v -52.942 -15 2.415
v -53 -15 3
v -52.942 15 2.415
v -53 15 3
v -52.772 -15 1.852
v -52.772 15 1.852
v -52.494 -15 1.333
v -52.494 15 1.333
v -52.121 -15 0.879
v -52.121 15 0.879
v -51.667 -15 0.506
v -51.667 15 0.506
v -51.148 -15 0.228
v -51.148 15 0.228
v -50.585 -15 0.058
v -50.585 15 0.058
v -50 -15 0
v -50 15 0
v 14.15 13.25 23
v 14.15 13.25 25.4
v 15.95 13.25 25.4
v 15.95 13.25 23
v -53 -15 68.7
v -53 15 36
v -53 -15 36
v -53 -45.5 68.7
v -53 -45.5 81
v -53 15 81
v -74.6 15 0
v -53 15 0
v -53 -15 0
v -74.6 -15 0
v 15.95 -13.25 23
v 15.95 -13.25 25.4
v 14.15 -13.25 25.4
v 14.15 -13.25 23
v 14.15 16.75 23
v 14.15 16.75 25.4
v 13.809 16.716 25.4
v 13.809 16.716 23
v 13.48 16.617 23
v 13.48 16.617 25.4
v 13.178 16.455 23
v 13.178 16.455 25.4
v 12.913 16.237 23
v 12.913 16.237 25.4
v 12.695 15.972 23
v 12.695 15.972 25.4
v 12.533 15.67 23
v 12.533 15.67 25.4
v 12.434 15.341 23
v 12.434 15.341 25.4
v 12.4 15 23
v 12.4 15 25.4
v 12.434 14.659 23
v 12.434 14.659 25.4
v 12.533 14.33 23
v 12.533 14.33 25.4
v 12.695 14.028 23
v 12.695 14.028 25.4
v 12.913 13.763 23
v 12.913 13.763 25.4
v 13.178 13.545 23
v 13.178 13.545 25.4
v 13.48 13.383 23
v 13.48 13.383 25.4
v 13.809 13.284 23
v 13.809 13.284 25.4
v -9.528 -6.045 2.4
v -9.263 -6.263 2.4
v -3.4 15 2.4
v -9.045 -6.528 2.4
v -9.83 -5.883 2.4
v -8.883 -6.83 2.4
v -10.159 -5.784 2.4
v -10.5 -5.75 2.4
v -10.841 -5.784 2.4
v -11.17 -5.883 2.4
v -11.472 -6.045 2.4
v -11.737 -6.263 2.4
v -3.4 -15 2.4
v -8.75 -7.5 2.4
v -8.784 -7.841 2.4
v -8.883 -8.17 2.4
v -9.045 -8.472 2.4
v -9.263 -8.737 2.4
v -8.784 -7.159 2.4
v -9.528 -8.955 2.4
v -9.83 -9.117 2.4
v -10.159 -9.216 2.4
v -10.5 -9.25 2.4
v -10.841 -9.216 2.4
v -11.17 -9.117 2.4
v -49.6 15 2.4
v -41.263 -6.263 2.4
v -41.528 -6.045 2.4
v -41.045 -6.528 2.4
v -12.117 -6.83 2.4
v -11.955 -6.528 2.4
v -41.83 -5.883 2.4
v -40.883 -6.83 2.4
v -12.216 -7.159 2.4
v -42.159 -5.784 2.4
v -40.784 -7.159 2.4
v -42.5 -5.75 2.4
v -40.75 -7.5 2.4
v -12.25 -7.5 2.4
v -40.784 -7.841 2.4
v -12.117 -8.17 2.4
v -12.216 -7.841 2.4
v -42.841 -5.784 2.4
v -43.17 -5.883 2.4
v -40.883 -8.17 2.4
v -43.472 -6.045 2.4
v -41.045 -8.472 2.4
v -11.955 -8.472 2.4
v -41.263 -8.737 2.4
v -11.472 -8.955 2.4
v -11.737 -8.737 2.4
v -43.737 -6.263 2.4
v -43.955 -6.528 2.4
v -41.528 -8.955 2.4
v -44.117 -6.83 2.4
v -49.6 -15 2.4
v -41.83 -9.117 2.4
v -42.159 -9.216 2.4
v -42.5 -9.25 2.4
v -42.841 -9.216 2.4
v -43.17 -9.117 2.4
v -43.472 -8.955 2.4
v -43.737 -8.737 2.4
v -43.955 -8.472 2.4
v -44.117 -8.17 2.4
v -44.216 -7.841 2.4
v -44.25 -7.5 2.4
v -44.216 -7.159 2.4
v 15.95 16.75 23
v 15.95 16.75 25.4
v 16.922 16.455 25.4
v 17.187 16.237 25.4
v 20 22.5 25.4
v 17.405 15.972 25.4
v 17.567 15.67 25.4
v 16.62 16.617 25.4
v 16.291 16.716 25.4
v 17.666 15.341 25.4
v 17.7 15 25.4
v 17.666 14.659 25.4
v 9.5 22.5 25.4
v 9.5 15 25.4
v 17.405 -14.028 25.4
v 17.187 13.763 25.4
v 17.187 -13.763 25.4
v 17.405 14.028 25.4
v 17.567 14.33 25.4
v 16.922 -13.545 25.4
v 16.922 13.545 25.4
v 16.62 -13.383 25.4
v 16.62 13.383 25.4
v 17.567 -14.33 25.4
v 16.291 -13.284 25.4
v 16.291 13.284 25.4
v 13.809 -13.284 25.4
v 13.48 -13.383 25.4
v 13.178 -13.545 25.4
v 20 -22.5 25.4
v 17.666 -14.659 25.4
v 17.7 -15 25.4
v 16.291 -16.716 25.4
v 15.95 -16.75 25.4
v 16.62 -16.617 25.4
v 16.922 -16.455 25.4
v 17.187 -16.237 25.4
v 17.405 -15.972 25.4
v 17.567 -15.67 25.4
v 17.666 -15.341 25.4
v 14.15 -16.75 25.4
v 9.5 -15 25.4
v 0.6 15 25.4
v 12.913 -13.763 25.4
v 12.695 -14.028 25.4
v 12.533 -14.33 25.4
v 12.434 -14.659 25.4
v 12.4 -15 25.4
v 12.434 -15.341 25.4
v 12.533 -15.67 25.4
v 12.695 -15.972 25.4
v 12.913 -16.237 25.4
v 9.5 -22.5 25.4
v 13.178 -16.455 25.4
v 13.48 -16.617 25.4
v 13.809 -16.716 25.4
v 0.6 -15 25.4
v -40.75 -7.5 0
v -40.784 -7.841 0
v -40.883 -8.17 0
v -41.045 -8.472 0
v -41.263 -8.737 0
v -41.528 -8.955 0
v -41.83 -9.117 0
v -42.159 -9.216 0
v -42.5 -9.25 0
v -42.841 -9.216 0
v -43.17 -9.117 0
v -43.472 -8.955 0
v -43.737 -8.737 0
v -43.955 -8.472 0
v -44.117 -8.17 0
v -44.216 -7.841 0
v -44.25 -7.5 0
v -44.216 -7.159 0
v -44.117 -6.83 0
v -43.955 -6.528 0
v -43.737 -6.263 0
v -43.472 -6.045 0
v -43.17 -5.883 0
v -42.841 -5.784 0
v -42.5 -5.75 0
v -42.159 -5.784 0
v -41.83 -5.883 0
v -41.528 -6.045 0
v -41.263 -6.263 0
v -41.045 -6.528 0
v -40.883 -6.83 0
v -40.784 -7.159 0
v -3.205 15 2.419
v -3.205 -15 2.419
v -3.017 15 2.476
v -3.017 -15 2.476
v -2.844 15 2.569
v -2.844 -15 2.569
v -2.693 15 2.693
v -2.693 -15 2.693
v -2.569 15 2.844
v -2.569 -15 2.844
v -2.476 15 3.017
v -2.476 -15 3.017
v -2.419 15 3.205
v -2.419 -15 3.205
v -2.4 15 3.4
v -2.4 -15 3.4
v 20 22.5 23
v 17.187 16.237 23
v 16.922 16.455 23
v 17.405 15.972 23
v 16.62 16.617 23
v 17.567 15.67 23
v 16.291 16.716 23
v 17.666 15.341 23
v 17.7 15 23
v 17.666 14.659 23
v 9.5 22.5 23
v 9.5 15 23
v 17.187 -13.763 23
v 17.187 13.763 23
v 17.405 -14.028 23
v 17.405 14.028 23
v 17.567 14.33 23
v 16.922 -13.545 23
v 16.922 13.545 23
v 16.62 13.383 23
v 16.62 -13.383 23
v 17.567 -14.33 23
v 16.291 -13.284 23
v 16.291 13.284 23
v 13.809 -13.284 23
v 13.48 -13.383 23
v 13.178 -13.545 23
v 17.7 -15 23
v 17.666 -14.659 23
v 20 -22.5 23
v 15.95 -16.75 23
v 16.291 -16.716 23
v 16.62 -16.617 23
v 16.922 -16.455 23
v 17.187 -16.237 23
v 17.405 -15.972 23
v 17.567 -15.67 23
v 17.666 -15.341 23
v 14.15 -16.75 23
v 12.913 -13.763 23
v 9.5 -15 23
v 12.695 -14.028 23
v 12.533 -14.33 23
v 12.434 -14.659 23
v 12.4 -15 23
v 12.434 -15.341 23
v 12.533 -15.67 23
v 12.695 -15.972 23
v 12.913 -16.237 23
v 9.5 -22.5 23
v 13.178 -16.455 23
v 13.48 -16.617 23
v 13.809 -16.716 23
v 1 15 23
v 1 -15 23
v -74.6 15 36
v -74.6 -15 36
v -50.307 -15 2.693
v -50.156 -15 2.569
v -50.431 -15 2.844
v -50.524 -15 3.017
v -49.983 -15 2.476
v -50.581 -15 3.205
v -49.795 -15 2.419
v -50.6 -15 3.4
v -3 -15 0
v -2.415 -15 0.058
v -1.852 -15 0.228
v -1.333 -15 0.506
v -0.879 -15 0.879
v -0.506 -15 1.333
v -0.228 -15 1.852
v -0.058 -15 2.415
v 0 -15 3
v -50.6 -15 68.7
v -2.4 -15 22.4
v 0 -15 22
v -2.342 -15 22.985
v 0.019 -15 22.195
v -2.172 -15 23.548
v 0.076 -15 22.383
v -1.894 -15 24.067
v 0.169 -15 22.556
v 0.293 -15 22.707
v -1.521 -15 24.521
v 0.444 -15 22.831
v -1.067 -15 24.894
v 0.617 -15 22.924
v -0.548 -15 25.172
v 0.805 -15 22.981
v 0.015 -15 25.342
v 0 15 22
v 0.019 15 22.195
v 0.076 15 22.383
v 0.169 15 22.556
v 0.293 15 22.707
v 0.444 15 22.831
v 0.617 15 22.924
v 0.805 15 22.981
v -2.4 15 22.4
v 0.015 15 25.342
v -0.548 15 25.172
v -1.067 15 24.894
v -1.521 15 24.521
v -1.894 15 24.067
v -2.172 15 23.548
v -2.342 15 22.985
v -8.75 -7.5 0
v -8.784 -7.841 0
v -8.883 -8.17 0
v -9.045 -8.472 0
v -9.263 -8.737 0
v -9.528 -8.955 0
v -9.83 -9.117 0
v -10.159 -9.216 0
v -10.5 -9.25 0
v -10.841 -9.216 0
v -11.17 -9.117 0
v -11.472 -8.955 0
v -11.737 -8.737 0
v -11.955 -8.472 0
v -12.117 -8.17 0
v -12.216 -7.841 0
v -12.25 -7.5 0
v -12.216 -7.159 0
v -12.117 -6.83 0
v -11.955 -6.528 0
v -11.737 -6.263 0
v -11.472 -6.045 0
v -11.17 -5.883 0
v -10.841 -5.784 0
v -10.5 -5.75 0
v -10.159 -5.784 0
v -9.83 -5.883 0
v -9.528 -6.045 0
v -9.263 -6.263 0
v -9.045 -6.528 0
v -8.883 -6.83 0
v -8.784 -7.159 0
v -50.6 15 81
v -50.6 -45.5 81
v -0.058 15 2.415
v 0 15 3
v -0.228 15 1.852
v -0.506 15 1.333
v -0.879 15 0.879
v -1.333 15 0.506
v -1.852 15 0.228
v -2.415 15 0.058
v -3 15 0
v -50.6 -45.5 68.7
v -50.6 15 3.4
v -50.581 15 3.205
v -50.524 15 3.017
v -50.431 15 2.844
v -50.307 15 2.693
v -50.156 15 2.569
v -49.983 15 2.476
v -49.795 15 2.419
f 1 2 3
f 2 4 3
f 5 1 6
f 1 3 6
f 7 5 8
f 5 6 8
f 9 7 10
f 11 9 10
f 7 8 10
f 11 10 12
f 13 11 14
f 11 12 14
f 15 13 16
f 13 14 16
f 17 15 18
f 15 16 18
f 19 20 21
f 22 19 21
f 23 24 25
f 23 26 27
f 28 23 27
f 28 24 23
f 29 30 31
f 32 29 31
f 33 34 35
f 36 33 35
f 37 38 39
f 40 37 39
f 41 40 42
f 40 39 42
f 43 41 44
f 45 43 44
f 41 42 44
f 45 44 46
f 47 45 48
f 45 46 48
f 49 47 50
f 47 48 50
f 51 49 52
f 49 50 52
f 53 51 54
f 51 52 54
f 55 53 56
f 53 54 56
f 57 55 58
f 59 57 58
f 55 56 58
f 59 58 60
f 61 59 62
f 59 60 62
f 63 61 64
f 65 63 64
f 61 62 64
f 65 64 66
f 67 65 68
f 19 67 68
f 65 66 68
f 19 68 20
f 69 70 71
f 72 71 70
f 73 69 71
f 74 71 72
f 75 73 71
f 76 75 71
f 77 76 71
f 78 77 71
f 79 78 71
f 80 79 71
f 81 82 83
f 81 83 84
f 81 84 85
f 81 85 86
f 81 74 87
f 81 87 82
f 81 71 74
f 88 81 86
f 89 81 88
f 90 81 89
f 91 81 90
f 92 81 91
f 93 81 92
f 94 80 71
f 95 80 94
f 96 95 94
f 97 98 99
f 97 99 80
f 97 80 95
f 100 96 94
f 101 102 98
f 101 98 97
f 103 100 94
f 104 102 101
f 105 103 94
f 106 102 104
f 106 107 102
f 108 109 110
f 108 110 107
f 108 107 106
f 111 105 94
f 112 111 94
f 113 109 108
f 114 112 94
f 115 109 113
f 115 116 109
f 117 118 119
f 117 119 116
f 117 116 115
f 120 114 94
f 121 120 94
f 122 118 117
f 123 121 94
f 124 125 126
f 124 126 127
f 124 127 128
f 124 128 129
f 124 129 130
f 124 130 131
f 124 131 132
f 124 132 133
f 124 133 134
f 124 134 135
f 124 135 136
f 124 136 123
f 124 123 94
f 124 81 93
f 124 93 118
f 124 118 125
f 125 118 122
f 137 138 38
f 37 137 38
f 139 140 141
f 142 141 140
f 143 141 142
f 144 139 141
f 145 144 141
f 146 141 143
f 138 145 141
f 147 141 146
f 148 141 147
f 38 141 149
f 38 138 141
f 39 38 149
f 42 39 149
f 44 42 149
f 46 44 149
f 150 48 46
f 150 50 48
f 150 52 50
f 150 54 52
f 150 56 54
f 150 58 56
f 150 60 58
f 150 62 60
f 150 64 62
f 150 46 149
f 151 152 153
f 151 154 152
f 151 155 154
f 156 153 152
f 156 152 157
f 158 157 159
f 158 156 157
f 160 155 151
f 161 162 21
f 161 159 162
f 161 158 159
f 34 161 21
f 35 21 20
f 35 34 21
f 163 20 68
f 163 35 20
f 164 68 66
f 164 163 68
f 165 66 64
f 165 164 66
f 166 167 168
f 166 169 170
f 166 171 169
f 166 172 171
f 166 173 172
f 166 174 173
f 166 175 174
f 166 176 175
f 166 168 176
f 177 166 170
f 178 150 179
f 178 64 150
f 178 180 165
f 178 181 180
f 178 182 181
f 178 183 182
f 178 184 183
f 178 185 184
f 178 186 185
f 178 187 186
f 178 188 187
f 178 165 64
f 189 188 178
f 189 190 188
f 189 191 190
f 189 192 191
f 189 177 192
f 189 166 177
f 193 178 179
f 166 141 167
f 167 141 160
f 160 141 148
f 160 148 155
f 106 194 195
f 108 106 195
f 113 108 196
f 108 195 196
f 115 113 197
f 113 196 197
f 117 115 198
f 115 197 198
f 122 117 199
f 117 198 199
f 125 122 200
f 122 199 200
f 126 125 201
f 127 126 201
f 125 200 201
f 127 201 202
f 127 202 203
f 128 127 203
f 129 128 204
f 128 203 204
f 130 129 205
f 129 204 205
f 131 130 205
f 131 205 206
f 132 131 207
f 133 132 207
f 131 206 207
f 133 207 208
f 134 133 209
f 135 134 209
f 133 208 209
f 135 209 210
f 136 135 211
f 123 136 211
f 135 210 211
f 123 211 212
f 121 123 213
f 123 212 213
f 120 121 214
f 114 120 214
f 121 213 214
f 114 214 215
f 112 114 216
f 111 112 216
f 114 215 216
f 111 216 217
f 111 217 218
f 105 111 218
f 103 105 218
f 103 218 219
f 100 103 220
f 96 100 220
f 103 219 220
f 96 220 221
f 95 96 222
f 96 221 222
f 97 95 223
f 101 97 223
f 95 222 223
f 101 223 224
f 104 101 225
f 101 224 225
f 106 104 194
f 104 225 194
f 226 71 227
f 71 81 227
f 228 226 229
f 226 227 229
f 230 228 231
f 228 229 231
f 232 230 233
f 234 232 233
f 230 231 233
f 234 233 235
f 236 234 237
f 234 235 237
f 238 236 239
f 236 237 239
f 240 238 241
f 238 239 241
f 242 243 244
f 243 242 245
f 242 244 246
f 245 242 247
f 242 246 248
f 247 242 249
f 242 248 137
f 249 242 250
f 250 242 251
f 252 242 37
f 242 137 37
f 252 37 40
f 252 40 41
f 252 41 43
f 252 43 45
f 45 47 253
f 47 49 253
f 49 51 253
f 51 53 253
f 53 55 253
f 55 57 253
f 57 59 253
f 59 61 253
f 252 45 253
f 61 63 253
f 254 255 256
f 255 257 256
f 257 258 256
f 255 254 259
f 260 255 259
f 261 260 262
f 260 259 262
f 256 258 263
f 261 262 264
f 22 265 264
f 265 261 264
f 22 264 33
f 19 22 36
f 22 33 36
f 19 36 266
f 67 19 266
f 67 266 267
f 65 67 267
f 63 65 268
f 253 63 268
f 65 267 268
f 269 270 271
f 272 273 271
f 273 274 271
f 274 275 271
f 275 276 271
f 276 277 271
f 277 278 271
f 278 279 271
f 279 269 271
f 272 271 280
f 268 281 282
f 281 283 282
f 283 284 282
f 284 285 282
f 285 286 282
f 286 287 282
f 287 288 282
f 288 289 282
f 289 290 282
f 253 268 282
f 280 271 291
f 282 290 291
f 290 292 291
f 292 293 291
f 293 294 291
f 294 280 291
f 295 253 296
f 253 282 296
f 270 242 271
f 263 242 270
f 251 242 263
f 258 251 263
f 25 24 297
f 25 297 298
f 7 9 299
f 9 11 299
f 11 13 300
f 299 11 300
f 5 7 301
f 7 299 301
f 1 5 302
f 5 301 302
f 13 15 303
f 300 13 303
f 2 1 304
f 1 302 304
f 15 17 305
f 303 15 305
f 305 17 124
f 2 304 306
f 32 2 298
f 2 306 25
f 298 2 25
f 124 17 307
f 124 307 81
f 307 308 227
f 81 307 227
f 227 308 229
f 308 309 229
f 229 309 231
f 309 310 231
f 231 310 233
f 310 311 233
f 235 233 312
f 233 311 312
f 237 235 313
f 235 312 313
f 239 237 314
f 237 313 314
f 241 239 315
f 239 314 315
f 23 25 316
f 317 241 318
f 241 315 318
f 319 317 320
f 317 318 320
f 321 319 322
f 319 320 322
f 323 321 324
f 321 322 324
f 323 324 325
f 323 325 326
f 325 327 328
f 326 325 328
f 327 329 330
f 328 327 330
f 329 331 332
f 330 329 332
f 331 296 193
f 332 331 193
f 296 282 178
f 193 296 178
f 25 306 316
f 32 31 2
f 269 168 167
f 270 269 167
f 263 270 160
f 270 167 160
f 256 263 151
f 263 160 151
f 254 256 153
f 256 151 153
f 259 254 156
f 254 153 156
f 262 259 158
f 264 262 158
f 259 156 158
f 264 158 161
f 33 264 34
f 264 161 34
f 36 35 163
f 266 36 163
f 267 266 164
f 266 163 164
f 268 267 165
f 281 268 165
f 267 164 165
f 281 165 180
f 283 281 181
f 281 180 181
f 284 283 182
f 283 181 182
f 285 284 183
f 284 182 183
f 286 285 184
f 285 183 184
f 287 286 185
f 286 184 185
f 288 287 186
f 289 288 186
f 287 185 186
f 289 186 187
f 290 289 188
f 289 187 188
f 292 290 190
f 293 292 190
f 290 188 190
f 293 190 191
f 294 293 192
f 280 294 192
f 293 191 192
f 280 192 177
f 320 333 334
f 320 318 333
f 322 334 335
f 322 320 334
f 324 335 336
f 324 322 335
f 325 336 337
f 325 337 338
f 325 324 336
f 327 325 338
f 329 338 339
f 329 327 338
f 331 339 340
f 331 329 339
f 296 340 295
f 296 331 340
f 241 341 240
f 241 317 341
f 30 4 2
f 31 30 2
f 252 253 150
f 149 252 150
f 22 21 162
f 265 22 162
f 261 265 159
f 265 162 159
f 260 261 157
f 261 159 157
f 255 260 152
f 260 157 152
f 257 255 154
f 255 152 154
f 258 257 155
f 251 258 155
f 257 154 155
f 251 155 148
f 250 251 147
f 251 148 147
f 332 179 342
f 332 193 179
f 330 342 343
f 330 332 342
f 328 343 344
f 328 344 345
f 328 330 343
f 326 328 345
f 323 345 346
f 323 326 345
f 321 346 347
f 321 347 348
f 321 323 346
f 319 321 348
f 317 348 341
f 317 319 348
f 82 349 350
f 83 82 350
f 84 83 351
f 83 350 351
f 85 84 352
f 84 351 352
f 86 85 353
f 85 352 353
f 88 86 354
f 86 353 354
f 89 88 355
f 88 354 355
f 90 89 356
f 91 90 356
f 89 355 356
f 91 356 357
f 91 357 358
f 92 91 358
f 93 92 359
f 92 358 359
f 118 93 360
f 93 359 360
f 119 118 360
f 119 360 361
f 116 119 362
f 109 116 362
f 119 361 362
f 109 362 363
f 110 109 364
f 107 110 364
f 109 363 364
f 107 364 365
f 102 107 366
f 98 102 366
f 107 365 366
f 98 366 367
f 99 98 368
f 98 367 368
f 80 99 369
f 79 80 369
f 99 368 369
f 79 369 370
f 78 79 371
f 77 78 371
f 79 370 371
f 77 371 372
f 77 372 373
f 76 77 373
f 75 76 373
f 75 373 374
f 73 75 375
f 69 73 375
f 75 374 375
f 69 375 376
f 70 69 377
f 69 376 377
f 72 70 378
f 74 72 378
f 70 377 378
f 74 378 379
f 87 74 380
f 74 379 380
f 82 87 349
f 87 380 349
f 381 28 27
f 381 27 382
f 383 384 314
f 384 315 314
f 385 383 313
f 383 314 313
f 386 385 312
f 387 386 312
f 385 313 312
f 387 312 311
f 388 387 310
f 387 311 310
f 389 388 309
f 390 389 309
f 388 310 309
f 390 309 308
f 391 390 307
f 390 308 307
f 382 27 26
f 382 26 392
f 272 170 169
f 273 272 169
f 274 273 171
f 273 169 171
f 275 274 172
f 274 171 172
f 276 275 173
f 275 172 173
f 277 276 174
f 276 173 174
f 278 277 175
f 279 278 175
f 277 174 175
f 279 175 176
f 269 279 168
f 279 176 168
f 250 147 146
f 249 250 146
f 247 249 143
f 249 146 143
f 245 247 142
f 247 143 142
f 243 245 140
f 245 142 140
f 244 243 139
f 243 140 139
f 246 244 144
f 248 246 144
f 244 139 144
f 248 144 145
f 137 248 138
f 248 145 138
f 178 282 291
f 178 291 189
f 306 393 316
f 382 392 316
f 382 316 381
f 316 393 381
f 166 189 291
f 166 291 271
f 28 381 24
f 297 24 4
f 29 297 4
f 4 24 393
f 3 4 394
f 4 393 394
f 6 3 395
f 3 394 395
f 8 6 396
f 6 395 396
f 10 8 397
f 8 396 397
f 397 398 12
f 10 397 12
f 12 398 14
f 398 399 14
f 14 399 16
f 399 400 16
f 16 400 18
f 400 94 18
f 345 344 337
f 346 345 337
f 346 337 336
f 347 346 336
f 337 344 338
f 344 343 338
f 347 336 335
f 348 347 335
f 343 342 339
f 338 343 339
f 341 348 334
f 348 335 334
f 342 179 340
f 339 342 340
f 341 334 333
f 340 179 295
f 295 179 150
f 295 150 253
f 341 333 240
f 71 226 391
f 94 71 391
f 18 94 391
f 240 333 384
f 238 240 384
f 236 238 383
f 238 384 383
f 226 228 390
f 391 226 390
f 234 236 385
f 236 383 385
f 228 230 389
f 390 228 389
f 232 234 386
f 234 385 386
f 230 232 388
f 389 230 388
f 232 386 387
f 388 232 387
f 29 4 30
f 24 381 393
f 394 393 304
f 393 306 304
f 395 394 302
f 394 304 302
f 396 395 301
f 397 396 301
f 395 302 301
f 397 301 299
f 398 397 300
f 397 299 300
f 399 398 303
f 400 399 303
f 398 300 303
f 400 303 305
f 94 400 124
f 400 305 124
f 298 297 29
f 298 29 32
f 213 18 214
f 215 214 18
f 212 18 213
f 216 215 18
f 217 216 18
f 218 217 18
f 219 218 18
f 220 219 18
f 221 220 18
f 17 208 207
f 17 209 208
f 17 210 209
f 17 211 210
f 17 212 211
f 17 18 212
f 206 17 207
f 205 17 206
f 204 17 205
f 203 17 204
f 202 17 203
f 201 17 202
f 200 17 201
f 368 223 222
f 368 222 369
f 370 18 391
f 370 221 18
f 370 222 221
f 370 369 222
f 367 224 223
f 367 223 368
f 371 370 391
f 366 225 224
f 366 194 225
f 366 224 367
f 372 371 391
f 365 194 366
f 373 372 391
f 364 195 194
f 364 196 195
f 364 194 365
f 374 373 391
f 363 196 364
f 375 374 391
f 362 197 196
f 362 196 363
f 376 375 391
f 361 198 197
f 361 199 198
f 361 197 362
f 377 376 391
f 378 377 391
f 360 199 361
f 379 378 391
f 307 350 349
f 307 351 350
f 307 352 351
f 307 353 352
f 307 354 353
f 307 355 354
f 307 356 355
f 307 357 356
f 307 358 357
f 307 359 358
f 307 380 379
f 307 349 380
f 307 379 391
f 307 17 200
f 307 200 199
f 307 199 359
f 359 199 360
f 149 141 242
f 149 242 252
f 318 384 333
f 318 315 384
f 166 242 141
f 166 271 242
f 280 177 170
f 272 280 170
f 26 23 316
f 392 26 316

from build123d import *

# Parameters (mm, degrees)
F1_DEPTH  = 15
F2_W      = 2.4
F2_H      = 12.3
F3_DEPTH  = 30.5
F2_W_2    = 10.5
F2_H_2    = 2.4
F4_DEPTH  = 7.5
F5_W      = 10.5
F5_H      = 2.4
F6_DEPTH  = 7.5
F8_DEPTH  = 2.4
F9_R      = 3
F10_R     = 1
F11_W     = 30
F11_H     = 33
F11_H_2   = 3
F12_DEPTH = 21.6
F13_R     = 1.75
F14_DEPTH = 2.4


with BuildPart() as f1:
    # F0 (on Front) → F1 (new body, symmetric)
    with BuildSketch(Plane.XZ):
        Polygon((-53, 0), (0, 0), (0, 23), (20, 23), (20, 25.4), (-2.4, 25.4), (-2.4, 2.4), (-50.6, 2.4), (-50.6, 81), (-53, 81), align=None)
    extrude(amount=F1_DEPTH, both=True)

    # F2 (on face) → F3 (join)
    with BuildSketch(Plane.XZ.offset(15)):
        with Locations((-51.8, 74.85)):
            Rectangle(F2_W, F2_H)
    extrude(amount=F3_DEPTH)

    # F2 (on face) → F4 (join)
    with BuildSketch(Plane.XZ.offset(15)):
        with Locations((14.75, 24.2)):
            Rectangle(F2_W_2, F2_H_2)
    extrude(amount=F4_DEPTH)

    # F5 (on face) → F6 (join)
    with BuildSketch(Plane(origin=(0, 15, 0), x_dir=(-1, 0, 0), z_dir=(0, 1, 0))):
        with Locations((-14.75, 24.2)):
            Rectangle(F5_W, F5_H)
    extrude(amount=F6_DEPTH)

    # F7 (on face) → F8 (cut, through all)
    with BuildSketch(Plane.XY.offset(25.4)):
        with BuildLine():
            ThreePointArc((15.05, -13.499166898), (14.6169272275, -13.3134416807), (14.15, -13.25))
            ThreePointArc((14.15, -13.25), (12.4, -15), (14.15, -16.75))
            ThreePointArc((14.15, -16.75), (14.6169272275, -16.6865583193), (15.05, -16.500833102))
            ThreePointArc((15.05, -16.500833102), (14.2, -15), (15.05, -13.499166898))
        make_face()
        with BuildLine():
            ThreePointArc((15.9, -15), (15.6727442333, -14.1375905845), (15.05, -13.499166898))
            ThreePointArc((15.05, -13.499166898), (14.2, -15), (15.05, -16.500833102))
            ThreePointArc((15.05, -16.500833102), (15.6727442333, -15.8624094155), (15.9, -15))
        make_face()
        with BuildLine():
            ThreePointArc((15.95, -13.25), (15.4830727725, -13.3134416807), (15.05, -13.499166898))
            ThreePointArc((15.05, -13.499166898), (15.6727442333, -14.1375905845), (15.9, -15))
            ThreePointArc((15.9, -15), (15.6727442333, -15.8624094155), (15.05, -16.500833102))
            ThreePointArc((15.05, -16.500833102), (15.4830727725, -16.6865583193), (15.95, -16.75))
            ThreePointArc((15.95, -16.75), (17.1874368671, -16.2374368671), (17.7, -15))
            ThreePointArc((17.7, -15), (17.1874368671, -13.7625631329), (15.95, -13.25))
        make_face()
        with BuildLine():
            Line((15.95, -13.25), (14.15, -13.25))
            ThreePointArc((14.15, -13.25), (14.6169272275, -13.3134416807), (15.05, -13.499166898))
            ThreePointArc((15.05, -13.499166898), (15.4830727725, -13.3134416807), (15.95, -13.25))
        make_face()
        with BuildLine():
            ThreePointArc((15.05, -16.500833102), (14.6169272275, -16.6865583193), (14.15, -16.75))
            Line((14.15, -16.75), (15.95, -16.75))
            ThreePointArc((15.95, -16.75), (15.4830727725, -16.6865583193), (15.05, -16.500833102))
        make_face()
        with BuildLine():
            ThreePointArc((15.05, 16.500833102), (14.6169272275, 16.6865583193), (14.15, 16.75))
            ThreePointArc((14.15, 16.75), (12.4, 15), (14.15, 13.25))
            ThreePointArc((14.15, 13.25), (14.6169272275, 13.3134416807), (15.05, 13.499166898))
            ThreePointArc((15.05, 13.499166898), (14.2, 15), (15.05, 16.500833102))
        make_face()
        with BuildLine():
            ThreePointArc((15.9, 15), (15.6727442333, 15.8624094155), (15.05, 16.500833102))
            ThreePointArc((15.05, 16.500833102), (14.2, 15), (15.05, 13.499166898))
            ThreePointArc((15.05, 13.499166898), (15.6727442333, 14.1375905845), (15.9, 15))
        make_face()
        with BuildLine():
            ThreePointArc((15.95, 16.75), (15.4830727725, 16.6865583193), (15.05, 16.500833102))
            ThreePointArc((15.05, 16.500833102), (15.6727442333, 15.8624094155), (15.9, 15))
            ThreePointArc((15.9, 15), (15.6727442333, 14.1375905845), (15.05, 13.499166898))
            ThreePointArc((15.05, 13.499166898), (15.4830727725, 13.3134416807), (15.95, 13.25))
            ThreePointArc((15.95, 13.25), (17.1874368671, 13.7625631329), (17.7, 15))
            ThreePointArc((17.7, 15), (17.1874368671, 16.2374368671), (15.95, 16.75))
        make_face()
        with BuildLine():
            Line((15.95, 16.75), (14.15, 16.75))
            ThreePointArc((14.15, 16.75), (14.6169272275, 16.6865583193), (15.05, 16.500833102))
            ThreePointArc((15.05, 16.500833102), (15.4830727725, 16.6865583193), (15.95, 16.75))
        make_face()
        with BuildLine():
            ThreePointArc((15.05, 13.499166898), (14.6169272275, 13.3134416807), (14.15, 13.25))
            Line((14.15, 13.25), (15.95, 13.25))
            ThreePointArc((15.95, 13.25), (15.4830727725, 13.3134416807), (15.05, 13.499166898))
        make_face()
    extrude(amount=-F8_DEPTH, mode=Mode.SUBTRACT)

    # F9
    f9_edges = [f1.edges().sort_by_distance(p)[0] for p in [
        (-2.4, 0, 25.4),
        (0, 0, 0),
        (-53, 0, 0),
    ]]
    fillet(f9_edges, radius=F9_R)

    # F10
    f10_edges = [f1.edges().sort_by_distance(p)[0] for p in [
        (-50.6, 0, 2.4),
        (-2.4, 0, 2.4),
        (0, 0, 23),
    ]]
    fillet(f10_edges, radius=F10_R)

    # F11 (on face) → F12 (join)
    with BuildSketch(Plane(origin=(-53, 0, 0), x_dir=(0, -1, 0), z_dir=(-1, 0, 0))):
        with Locations((0, 19.5)):
            Rectangle(F11_W, F11_H)
        with Locations((0, 1.5)):
            Rectangle(F11_W, F11_H_2)
    extrude(amount=F12_DEPTH)

    # F13 (on face) → F14 (cut, through all)
    with BuildSketch(Plane(origin=(0, 0, 0), x_dir=(1, 0, 0), z_dir=(0, 0, -1))):
        with Locations((-42.5, 7.5)):
            Circle(F13_R)
        with Locations((-10.5, 7.5)):
            Circle(F13_R)
    extrude(amount=-F14_DEPTH, mode=Mode.SUBTRACT)


solid = f1.part
